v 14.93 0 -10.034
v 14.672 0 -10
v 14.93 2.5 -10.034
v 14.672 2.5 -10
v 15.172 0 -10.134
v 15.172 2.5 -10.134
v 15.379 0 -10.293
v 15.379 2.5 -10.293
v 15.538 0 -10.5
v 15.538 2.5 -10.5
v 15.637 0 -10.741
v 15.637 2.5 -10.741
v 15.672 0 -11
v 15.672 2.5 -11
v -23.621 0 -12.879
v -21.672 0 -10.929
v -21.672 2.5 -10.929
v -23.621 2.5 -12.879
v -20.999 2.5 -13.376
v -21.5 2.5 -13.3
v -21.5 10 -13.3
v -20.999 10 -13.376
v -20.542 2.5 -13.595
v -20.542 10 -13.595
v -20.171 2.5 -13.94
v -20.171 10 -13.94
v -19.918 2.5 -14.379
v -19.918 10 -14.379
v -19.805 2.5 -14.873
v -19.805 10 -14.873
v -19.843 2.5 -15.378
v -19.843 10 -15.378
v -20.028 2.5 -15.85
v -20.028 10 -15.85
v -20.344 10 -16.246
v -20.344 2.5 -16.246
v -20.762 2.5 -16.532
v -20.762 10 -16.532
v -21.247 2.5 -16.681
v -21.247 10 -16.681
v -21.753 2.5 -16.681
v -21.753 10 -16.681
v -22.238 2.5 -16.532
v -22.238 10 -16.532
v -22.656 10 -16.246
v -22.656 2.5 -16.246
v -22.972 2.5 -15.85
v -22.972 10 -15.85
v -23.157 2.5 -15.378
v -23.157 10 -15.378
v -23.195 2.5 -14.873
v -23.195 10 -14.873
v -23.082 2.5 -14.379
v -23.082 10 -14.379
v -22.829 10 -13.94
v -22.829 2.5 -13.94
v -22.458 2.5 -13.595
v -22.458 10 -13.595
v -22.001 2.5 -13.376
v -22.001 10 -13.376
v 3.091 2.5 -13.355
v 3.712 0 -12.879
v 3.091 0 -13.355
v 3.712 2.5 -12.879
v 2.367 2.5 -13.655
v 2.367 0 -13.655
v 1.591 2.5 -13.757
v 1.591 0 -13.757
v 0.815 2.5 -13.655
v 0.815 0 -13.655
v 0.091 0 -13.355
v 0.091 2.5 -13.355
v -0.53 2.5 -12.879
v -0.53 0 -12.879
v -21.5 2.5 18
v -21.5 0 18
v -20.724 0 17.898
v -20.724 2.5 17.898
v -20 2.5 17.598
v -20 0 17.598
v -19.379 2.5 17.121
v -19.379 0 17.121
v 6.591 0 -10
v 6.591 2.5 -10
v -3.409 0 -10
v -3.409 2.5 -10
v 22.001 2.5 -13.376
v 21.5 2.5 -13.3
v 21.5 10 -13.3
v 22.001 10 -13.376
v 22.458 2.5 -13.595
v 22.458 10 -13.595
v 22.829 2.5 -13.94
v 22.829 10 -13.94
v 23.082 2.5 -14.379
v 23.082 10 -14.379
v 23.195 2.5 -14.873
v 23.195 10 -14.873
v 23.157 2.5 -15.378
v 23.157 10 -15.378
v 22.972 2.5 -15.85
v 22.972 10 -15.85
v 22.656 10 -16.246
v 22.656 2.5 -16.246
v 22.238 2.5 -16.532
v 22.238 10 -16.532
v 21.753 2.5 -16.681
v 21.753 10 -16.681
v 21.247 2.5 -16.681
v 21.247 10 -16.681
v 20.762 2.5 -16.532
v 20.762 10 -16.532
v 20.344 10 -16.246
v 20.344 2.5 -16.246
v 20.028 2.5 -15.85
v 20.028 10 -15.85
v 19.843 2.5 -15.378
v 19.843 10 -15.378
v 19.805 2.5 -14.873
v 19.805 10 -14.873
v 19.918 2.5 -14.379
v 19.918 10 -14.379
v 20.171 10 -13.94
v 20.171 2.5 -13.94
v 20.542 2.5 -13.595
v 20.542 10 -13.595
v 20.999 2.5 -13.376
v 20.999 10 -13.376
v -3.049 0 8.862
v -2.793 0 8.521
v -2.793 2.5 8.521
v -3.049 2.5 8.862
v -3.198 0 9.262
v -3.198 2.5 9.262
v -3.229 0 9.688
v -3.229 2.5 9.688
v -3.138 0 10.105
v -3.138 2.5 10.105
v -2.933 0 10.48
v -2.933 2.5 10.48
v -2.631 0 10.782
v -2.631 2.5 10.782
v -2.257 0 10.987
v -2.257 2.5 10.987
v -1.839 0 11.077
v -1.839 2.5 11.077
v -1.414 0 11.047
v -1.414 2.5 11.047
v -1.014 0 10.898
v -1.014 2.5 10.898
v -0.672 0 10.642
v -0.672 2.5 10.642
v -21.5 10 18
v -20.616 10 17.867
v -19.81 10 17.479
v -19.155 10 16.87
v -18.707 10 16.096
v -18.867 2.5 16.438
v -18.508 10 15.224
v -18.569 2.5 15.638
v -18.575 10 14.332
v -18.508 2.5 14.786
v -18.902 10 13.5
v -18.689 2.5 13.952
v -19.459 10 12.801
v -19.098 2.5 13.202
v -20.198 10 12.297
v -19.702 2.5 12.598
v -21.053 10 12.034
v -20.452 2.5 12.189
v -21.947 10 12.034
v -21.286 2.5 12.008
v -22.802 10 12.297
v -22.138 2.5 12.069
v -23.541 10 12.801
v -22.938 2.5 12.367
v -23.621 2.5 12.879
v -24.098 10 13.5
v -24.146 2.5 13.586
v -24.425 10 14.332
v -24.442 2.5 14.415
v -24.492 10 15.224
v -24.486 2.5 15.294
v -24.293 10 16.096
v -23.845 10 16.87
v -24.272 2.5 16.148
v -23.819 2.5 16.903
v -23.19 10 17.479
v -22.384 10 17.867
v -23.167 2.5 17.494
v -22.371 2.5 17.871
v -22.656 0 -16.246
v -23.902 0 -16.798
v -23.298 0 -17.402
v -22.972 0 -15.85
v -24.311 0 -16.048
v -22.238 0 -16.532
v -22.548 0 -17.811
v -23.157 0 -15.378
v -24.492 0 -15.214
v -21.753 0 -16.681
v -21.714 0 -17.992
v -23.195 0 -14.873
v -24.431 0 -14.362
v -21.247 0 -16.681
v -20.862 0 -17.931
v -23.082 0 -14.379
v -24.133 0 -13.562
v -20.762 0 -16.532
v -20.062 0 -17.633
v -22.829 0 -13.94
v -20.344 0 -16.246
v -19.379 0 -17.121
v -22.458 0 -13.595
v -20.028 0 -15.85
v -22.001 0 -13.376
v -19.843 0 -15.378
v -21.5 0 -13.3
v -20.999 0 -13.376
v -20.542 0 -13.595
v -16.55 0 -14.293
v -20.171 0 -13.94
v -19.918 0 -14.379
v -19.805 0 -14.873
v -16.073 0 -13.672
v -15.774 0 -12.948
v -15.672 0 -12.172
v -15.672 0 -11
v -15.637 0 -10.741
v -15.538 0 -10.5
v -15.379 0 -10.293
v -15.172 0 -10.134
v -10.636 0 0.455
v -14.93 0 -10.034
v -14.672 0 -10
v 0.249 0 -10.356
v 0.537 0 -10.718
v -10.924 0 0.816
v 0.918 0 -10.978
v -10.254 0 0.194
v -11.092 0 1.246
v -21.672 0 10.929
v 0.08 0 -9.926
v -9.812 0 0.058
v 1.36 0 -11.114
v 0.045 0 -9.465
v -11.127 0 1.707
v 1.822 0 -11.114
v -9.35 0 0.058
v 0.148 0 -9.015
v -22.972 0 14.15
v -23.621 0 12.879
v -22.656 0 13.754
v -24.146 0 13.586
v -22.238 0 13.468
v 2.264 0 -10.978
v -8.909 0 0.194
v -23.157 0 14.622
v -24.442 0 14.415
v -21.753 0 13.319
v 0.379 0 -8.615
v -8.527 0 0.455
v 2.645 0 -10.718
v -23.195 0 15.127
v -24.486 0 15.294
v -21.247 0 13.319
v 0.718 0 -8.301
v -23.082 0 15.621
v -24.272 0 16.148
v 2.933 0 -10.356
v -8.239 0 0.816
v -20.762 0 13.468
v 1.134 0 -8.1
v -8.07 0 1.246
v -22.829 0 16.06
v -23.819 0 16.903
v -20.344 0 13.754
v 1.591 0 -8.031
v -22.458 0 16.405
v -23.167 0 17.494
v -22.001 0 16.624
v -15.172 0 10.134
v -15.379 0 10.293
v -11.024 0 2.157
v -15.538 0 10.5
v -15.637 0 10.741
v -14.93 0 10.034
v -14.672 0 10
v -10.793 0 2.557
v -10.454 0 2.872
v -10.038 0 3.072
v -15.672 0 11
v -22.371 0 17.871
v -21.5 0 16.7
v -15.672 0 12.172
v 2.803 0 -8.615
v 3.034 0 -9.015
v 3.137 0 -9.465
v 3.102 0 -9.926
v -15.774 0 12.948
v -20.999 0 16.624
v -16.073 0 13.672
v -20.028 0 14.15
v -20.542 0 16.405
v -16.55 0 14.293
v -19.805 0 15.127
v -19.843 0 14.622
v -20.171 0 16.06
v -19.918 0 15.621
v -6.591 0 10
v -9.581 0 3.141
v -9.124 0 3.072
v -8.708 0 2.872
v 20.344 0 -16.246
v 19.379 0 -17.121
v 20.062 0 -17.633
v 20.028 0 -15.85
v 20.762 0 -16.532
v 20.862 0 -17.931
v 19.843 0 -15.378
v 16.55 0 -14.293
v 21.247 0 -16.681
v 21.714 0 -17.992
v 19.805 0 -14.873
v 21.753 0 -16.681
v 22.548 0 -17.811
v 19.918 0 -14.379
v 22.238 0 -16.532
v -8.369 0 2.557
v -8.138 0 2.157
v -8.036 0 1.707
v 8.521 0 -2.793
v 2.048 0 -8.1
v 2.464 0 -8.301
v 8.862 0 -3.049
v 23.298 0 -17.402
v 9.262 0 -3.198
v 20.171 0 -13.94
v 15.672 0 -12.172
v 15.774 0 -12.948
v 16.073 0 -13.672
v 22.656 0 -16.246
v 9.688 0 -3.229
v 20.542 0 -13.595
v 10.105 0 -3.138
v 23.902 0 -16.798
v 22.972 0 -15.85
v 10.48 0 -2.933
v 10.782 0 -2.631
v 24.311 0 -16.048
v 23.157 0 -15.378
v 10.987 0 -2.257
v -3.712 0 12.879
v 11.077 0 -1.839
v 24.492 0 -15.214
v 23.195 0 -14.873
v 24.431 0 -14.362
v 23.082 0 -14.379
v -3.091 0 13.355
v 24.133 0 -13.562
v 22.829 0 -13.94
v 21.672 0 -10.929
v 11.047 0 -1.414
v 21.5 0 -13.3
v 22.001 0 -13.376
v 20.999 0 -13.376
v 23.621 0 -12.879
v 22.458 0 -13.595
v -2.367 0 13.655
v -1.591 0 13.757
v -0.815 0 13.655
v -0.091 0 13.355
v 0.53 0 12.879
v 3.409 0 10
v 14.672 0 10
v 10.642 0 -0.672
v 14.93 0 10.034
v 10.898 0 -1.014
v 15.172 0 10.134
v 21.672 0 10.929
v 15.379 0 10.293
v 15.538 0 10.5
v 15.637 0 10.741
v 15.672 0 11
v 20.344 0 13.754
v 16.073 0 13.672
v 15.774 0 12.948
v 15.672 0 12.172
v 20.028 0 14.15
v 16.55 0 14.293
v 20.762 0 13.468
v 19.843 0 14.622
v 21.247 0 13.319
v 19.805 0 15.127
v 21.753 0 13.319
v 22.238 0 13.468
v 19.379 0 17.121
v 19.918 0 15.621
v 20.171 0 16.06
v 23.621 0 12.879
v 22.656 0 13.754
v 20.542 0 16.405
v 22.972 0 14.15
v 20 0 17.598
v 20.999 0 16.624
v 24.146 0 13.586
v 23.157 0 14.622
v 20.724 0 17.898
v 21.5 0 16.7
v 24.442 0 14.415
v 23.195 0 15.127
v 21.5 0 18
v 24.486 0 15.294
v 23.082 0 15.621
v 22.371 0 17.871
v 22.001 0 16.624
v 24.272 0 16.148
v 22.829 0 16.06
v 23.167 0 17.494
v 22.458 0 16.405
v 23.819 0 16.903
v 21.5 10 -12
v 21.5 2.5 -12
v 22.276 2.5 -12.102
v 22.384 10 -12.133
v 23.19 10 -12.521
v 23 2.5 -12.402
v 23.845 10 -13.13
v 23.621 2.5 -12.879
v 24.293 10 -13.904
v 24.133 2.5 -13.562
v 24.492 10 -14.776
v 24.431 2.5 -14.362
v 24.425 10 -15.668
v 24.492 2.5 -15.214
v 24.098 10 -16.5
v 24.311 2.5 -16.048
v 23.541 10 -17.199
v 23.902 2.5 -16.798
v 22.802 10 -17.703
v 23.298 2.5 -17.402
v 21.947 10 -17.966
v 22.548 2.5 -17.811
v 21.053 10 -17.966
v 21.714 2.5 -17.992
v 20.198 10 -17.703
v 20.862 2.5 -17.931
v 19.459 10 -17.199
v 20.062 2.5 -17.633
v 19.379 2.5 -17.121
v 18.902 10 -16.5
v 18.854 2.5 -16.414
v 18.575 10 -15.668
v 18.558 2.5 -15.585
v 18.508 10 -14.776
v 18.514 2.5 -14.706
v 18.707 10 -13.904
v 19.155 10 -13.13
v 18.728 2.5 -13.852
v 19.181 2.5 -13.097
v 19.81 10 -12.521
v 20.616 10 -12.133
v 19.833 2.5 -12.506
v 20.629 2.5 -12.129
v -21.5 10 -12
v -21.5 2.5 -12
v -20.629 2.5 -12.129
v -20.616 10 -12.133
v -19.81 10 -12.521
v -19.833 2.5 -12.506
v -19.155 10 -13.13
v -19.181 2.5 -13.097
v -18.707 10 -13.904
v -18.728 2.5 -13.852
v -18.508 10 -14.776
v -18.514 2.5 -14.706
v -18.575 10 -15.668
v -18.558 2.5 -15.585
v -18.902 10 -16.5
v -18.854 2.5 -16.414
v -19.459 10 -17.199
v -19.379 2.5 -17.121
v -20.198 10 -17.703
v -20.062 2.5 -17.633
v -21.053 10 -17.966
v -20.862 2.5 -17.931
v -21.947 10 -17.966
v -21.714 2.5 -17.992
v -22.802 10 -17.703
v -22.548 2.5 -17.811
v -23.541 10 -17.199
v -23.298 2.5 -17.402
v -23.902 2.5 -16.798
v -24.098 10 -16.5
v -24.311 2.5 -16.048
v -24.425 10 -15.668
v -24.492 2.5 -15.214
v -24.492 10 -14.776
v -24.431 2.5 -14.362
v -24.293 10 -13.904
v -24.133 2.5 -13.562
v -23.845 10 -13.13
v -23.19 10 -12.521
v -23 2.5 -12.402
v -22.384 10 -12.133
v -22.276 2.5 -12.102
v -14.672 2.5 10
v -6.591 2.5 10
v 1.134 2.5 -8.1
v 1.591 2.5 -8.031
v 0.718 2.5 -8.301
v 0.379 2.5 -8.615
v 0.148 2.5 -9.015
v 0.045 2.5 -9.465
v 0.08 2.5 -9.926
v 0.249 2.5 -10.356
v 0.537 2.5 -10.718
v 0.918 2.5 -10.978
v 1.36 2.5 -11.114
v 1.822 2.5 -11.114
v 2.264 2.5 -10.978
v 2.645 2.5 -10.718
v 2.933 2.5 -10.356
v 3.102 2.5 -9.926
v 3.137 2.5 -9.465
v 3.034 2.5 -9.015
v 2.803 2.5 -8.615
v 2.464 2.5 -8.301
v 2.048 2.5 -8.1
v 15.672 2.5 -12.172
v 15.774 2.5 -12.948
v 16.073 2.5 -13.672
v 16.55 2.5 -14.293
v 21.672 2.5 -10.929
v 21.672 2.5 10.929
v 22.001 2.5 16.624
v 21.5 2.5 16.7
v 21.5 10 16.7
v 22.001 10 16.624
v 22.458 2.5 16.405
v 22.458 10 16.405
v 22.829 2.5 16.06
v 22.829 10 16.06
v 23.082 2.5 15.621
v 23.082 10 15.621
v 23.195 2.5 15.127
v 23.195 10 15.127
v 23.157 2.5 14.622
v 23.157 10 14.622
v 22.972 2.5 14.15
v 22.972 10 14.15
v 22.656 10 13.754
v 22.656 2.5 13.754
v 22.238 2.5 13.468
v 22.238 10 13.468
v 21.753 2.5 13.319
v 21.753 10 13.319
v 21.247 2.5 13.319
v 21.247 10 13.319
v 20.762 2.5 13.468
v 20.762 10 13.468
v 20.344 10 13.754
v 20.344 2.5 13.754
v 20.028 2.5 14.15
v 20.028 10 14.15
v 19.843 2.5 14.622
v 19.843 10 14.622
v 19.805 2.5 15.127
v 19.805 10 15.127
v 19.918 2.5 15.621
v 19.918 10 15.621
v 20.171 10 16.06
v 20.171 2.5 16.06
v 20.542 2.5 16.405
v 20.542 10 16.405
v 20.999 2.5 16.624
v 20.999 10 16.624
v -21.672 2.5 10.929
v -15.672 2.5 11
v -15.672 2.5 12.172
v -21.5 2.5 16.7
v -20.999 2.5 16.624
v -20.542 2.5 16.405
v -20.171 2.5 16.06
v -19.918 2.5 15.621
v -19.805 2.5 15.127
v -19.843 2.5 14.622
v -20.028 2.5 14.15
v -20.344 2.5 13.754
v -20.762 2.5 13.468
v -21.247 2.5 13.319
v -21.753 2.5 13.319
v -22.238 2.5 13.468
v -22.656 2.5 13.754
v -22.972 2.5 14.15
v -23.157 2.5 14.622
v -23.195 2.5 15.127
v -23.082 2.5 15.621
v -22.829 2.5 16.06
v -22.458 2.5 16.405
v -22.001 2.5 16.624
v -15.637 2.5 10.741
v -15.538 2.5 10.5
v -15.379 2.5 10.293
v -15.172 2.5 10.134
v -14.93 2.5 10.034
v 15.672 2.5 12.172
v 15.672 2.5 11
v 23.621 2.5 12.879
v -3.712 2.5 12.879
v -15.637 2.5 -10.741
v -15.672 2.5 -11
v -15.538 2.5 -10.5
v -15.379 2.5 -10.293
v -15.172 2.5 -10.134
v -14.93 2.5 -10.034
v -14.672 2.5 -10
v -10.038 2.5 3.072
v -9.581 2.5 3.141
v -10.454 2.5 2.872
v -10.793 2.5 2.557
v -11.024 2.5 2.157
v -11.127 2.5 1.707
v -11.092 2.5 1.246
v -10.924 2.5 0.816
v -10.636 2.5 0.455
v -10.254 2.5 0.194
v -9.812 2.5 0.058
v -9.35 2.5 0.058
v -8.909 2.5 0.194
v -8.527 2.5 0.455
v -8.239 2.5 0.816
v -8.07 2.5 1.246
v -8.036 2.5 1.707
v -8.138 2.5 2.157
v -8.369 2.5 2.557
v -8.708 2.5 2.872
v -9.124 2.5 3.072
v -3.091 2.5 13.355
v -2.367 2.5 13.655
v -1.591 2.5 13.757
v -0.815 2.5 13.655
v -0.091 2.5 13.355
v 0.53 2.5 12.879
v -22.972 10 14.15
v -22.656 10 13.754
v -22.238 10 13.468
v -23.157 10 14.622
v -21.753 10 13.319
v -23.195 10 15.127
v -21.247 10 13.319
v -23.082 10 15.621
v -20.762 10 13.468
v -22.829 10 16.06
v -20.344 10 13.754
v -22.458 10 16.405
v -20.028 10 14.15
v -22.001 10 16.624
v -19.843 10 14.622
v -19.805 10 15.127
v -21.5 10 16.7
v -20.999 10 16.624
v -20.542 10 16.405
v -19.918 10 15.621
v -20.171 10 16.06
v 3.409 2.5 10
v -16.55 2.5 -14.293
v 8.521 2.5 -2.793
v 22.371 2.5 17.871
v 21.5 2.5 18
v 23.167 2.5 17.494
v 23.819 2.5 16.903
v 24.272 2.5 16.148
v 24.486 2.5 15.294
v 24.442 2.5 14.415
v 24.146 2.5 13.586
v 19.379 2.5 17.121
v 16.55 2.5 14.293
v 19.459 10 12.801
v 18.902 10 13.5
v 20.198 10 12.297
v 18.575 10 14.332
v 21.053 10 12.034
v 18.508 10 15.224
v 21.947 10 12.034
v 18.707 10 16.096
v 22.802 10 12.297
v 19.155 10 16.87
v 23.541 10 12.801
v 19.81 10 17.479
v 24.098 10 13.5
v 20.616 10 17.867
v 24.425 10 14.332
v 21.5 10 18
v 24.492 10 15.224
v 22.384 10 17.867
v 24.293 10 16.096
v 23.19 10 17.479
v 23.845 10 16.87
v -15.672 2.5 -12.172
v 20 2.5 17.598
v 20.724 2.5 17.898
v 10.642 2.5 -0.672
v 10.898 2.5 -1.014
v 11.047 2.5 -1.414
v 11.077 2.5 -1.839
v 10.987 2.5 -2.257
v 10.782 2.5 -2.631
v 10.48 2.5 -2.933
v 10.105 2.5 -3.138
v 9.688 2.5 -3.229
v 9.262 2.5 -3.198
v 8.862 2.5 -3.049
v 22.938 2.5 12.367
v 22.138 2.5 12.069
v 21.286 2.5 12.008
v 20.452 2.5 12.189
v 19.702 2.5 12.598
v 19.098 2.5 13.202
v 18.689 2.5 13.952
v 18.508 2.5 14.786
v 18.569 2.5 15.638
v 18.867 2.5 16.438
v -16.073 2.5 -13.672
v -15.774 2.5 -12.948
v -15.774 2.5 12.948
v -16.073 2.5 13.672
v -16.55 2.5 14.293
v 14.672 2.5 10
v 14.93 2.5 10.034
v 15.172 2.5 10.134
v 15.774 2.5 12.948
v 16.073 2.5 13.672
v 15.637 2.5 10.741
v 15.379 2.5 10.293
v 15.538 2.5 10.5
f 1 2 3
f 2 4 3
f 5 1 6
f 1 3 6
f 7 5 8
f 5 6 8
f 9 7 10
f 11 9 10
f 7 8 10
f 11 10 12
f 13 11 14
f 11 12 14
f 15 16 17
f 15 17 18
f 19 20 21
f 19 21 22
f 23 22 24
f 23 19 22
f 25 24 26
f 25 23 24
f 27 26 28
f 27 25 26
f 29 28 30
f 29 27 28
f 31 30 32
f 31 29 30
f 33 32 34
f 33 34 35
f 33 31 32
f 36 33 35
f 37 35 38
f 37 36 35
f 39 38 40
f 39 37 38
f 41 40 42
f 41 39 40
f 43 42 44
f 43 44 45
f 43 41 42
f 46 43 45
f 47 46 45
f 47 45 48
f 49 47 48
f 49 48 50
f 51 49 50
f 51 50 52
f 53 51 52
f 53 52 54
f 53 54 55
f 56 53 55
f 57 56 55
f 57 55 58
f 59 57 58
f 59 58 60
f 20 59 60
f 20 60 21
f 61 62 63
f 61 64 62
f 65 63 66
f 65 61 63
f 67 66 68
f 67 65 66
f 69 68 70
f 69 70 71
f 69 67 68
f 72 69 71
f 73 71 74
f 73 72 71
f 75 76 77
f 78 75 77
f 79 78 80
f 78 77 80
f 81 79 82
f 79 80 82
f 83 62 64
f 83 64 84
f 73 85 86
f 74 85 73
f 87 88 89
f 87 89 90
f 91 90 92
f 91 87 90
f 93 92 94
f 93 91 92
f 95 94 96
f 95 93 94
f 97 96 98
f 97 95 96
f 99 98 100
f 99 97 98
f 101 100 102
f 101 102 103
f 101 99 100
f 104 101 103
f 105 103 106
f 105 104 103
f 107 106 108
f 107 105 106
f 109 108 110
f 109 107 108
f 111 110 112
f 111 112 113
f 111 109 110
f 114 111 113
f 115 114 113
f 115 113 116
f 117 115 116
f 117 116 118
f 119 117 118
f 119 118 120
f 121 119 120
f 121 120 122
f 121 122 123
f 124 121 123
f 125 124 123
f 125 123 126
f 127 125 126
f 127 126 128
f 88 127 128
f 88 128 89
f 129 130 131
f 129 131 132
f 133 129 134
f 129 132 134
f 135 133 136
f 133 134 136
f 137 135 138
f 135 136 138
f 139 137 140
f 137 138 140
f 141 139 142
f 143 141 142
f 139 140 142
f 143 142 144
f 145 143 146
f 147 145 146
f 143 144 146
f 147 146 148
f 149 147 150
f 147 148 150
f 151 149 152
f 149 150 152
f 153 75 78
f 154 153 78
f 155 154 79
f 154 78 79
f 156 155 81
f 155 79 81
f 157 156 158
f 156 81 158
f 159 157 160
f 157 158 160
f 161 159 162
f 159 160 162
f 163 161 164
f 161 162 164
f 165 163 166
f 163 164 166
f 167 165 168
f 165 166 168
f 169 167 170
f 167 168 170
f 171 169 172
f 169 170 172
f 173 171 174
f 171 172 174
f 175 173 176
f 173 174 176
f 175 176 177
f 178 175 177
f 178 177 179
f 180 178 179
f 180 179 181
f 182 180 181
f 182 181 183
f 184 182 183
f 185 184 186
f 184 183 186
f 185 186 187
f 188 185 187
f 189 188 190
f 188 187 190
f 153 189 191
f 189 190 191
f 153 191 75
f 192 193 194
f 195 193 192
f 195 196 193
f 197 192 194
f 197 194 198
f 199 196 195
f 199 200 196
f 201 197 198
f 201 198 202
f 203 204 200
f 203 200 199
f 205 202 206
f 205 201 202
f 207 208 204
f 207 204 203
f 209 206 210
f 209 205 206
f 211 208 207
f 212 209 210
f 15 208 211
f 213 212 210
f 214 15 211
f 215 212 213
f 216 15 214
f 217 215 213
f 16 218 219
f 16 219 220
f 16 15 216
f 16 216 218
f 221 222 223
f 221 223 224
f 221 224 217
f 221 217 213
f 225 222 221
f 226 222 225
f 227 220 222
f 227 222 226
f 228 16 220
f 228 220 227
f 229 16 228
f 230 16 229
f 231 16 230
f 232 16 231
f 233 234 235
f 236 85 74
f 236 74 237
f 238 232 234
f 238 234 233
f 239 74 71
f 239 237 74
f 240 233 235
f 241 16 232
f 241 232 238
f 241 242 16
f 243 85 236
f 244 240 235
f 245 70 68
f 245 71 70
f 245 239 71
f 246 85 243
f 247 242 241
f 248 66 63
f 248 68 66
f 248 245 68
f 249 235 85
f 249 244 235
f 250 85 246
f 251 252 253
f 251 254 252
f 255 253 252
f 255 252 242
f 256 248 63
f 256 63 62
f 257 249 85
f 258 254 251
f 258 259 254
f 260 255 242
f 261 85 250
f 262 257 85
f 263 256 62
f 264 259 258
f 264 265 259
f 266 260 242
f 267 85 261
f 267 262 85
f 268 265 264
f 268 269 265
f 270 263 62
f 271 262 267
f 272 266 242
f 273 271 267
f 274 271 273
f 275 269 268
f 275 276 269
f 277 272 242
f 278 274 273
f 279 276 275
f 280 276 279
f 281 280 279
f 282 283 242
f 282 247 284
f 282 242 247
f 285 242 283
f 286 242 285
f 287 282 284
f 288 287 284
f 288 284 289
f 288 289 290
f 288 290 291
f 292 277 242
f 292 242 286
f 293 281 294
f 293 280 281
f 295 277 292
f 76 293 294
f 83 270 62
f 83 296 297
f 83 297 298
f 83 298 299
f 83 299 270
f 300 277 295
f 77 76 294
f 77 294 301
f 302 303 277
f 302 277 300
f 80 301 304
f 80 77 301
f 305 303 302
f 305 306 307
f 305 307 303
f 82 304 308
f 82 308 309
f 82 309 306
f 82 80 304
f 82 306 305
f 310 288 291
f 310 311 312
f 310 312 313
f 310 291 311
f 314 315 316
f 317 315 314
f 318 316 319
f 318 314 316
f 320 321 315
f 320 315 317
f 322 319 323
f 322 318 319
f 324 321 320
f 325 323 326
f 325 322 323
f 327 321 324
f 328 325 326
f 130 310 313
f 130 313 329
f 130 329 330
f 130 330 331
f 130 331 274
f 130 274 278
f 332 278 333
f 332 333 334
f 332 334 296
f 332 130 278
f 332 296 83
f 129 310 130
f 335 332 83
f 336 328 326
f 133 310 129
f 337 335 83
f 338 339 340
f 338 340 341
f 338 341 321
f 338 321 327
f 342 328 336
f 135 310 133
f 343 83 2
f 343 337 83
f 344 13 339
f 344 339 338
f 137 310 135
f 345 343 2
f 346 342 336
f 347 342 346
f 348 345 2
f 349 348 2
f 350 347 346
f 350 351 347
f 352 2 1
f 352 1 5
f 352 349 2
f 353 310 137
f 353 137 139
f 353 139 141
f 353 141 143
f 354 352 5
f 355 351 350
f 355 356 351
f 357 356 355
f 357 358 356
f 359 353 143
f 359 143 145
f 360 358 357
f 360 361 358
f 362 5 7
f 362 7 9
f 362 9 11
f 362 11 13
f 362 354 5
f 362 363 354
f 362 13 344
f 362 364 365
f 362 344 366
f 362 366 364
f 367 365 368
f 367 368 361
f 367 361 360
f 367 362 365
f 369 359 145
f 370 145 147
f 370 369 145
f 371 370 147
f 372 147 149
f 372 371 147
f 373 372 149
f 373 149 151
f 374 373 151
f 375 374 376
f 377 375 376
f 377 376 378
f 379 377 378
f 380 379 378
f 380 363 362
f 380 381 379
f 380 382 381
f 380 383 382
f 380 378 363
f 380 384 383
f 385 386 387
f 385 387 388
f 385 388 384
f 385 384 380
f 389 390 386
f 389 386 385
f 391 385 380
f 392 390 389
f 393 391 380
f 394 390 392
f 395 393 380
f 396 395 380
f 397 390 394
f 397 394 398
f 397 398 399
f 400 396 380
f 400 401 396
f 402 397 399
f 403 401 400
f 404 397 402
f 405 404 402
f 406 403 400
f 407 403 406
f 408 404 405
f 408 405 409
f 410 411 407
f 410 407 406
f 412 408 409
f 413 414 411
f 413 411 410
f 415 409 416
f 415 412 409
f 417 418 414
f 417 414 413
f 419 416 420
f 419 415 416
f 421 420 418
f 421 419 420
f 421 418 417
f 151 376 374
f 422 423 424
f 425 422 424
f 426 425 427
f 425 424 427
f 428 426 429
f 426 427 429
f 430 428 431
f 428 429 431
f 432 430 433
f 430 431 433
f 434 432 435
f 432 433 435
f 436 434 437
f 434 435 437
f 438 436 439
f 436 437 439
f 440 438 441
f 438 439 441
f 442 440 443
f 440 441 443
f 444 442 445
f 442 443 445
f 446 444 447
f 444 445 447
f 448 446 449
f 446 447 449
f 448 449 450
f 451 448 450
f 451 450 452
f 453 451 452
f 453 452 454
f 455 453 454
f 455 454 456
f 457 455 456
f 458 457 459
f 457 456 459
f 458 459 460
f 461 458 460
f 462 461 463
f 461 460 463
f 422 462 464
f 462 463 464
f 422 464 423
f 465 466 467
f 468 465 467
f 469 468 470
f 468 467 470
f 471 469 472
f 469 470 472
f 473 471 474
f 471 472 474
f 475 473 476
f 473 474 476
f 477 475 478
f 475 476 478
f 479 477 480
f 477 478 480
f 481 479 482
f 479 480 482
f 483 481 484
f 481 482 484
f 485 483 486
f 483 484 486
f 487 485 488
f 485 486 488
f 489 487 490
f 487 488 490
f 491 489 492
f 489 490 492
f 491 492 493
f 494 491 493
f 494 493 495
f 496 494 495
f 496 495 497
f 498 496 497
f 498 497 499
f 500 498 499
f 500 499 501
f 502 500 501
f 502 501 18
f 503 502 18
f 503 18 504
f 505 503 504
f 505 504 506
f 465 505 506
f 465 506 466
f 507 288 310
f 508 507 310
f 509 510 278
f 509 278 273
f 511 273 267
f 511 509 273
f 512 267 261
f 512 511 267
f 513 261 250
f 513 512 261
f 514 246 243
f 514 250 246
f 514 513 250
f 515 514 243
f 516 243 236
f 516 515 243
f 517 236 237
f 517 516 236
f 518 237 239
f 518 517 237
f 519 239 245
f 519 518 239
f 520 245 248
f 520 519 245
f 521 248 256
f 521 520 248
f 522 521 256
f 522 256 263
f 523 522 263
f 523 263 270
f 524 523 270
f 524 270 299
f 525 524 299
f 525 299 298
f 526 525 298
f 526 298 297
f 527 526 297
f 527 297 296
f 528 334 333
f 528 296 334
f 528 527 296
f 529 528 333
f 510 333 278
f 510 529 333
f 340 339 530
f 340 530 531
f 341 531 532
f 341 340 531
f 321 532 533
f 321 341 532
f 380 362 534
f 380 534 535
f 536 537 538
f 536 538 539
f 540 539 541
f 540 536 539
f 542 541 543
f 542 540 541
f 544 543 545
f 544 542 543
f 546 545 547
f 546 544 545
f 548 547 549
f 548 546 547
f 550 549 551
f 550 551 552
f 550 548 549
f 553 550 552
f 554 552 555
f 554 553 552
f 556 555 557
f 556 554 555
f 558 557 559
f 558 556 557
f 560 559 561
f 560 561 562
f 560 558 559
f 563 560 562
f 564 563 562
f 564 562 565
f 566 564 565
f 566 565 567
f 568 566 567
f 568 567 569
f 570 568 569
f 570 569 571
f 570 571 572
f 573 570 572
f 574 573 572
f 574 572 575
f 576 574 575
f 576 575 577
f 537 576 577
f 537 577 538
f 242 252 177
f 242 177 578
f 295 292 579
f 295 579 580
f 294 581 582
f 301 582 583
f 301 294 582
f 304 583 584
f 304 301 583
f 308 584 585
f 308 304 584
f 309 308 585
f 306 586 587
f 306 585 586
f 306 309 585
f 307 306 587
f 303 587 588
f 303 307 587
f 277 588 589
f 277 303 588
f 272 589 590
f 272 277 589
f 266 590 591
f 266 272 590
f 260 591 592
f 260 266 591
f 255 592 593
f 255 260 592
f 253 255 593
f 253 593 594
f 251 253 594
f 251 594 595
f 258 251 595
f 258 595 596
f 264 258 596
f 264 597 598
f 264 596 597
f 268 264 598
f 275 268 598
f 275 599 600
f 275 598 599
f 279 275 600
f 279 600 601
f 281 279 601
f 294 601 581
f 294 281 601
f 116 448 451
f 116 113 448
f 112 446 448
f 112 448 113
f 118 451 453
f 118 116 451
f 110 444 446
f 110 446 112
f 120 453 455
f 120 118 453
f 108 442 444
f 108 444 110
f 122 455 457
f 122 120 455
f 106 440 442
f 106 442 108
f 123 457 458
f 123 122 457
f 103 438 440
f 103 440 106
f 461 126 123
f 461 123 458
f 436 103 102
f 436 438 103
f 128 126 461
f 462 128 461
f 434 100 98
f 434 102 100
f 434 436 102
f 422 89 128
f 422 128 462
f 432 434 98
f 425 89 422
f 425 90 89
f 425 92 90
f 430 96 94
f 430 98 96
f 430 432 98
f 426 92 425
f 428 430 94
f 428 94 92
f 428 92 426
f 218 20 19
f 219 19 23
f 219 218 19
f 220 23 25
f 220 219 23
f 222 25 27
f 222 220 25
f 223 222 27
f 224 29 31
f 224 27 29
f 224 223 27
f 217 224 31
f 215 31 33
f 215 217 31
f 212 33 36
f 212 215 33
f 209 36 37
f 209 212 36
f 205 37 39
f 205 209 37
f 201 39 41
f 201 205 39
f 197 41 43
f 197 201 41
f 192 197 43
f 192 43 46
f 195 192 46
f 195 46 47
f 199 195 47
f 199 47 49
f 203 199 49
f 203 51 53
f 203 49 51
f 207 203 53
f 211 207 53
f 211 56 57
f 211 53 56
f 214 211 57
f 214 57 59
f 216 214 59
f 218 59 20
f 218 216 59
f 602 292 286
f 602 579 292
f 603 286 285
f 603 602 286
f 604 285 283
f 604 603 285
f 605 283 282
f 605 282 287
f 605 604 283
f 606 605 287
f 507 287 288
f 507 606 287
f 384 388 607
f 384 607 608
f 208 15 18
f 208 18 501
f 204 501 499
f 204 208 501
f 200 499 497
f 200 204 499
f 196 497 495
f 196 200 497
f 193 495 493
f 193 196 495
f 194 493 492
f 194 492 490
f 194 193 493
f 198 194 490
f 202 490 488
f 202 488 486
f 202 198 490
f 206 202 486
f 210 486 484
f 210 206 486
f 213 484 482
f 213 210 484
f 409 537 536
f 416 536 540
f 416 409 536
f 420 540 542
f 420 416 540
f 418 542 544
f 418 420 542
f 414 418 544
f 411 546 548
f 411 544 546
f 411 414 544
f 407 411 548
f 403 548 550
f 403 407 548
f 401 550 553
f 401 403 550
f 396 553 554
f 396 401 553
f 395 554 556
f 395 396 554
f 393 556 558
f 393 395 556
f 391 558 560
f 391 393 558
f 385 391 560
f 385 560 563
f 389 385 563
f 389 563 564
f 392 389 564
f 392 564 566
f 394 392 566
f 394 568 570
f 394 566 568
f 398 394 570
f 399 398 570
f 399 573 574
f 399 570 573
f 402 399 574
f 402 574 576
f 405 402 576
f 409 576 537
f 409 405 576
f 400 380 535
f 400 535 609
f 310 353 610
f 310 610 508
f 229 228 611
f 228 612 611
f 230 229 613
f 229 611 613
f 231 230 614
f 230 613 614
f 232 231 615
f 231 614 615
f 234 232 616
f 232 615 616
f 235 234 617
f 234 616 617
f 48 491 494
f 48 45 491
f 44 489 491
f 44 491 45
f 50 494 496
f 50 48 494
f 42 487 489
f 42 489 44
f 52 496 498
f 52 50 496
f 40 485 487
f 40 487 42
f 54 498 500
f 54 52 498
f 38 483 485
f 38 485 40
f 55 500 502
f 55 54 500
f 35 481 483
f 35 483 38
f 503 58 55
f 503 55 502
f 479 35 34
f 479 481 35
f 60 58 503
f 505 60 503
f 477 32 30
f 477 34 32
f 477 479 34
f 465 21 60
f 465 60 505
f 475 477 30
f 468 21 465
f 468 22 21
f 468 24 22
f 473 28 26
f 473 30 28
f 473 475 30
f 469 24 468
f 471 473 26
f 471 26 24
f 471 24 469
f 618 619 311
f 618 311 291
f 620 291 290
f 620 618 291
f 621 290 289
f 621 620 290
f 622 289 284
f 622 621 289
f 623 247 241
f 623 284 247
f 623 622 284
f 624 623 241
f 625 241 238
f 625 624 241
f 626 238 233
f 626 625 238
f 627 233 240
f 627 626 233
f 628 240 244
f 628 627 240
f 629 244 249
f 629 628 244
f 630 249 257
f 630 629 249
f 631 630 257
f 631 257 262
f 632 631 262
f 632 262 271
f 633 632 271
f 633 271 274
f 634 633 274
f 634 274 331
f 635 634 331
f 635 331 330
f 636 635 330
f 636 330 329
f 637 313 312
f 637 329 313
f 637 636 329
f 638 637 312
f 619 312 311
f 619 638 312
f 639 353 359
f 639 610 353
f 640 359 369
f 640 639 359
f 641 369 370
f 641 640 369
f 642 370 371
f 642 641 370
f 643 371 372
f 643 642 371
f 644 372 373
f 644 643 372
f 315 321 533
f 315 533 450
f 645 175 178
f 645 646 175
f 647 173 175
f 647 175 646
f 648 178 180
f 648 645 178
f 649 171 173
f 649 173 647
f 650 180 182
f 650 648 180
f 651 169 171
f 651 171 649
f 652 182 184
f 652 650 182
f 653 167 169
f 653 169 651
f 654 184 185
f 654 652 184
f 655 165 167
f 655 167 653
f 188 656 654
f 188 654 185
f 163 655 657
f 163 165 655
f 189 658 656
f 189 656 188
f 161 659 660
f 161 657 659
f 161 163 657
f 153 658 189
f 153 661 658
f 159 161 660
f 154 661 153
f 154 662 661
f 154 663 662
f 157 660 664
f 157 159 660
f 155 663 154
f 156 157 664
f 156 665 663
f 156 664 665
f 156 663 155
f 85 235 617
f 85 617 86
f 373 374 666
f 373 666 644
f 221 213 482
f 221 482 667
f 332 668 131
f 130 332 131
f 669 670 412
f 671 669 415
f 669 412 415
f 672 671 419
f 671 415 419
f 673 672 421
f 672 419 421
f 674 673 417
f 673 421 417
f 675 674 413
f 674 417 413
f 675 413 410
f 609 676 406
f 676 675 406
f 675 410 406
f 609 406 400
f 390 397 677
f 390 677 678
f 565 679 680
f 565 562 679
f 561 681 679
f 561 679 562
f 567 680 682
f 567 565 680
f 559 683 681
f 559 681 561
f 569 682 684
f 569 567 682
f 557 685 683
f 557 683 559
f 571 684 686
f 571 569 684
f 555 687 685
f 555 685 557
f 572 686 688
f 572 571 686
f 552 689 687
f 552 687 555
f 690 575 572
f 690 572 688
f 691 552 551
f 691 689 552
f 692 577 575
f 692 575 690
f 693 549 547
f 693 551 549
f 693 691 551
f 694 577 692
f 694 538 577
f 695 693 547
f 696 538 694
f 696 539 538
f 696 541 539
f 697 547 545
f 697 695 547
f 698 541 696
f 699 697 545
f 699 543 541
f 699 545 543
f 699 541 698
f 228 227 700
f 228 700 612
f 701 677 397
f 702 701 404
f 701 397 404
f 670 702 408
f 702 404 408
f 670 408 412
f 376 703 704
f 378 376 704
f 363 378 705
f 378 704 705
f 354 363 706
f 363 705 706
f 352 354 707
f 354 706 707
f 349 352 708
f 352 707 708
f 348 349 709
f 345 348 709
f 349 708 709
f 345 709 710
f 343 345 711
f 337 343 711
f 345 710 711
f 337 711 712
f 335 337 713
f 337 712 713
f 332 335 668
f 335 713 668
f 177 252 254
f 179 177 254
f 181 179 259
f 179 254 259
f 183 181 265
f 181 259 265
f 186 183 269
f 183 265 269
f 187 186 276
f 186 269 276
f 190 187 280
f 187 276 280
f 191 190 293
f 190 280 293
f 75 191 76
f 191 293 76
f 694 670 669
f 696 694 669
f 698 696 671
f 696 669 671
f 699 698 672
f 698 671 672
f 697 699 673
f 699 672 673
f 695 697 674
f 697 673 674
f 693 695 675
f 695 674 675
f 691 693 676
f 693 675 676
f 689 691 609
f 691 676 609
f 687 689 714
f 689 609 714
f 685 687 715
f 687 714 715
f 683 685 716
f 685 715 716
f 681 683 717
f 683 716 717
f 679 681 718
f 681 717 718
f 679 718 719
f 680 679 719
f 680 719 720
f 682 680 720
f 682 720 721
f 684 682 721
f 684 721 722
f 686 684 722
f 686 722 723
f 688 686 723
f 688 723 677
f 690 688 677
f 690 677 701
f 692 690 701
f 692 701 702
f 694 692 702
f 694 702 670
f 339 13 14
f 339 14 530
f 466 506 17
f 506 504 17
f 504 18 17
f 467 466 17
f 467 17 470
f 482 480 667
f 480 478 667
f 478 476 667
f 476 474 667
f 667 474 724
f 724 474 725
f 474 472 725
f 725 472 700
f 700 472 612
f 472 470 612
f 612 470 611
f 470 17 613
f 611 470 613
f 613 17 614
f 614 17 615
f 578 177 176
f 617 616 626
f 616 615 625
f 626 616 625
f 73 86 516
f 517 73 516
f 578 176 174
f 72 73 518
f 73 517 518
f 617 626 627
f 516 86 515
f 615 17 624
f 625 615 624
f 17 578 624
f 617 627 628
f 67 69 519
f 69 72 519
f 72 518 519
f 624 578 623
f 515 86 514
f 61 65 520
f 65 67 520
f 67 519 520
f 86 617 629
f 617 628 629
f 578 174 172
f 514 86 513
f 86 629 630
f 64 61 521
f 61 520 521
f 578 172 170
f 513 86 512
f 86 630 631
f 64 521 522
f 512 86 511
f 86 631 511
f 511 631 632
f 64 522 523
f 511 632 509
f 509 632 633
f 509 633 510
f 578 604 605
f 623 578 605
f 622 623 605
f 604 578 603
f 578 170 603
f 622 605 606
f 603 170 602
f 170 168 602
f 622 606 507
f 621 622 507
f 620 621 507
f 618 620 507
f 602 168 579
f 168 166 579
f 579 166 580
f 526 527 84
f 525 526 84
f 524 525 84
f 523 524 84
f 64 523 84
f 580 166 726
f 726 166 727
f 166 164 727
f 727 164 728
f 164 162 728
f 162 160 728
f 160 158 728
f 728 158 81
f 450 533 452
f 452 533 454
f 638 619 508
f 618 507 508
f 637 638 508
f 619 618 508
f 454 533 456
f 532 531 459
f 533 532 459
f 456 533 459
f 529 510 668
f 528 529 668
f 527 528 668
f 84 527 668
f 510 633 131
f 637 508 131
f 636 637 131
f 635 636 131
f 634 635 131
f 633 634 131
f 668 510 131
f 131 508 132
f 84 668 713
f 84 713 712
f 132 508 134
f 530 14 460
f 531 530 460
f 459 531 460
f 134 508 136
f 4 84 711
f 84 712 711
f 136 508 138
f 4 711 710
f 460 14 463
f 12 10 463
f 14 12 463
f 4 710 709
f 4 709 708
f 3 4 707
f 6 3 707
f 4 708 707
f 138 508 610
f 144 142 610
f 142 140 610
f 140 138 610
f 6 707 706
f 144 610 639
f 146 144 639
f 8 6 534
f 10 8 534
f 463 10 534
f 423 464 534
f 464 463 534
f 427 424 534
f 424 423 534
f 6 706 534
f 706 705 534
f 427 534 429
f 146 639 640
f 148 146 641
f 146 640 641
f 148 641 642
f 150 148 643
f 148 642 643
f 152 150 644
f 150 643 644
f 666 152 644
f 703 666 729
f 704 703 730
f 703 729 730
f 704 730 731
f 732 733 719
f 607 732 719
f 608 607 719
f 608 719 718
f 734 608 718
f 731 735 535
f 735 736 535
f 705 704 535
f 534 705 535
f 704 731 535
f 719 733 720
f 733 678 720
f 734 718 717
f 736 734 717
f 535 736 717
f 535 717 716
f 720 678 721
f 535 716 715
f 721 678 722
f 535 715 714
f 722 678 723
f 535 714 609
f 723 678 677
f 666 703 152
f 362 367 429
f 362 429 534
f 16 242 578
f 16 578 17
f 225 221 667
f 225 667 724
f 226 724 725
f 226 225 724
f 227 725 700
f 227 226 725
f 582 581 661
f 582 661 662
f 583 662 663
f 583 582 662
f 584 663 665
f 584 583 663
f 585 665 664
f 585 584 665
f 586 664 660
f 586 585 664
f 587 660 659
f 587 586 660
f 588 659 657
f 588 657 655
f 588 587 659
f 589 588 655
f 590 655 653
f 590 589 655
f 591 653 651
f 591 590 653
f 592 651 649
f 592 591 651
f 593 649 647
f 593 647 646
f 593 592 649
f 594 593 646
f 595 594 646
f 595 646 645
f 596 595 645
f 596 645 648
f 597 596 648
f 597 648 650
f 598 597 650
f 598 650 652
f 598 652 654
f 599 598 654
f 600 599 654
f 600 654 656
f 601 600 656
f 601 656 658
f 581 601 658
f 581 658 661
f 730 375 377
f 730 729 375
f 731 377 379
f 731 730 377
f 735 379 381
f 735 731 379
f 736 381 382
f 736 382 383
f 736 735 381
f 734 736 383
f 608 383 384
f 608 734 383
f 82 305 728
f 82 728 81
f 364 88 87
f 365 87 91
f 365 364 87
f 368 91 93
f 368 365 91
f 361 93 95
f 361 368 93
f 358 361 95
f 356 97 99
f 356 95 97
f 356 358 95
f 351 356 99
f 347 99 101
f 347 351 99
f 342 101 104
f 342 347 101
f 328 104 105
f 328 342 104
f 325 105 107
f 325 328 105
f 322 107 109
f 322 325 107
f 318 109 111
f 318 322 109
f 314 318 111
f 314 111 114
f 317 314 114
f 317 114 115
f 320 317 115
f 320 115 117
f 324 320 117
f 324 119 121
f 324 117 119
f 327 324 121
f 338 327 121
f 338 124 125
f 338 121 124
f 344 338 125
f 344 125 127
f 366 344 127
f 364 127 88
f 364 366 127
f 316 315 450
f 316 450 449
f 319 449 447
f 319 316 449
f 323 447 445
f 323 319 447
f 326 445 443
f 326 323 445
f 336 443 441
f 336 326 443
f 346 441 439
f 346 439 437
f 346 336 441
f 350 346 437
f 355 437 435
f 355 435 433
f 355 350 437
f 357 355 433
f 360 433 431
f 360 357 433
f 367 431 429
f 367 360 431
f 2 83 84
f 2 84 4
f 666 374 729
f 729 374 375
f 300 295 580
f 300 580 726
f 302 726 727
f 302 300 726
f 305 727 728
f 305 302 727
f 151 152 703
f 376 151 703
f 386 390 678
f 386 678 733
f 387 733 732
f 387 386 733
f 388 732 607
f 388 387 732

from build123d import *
from build123d.topology import SkipClean

# Parameters (mm, degrees)
SKETCH1_R               = 3
SKETCH1_R_2             = 1.7
BOSS_EXTRUDE1_DEPTH     = 10
BOSS_EXTRUDE1_2_DEPTH   = 10
BOSS_EXTRUDE1_3_DEPTH   = 10
BOSS_EXTRUDE1_4_DEPTH   = 10
BOSS_EXTRUDE2_DEPTH     = 2.5
CUT_EXTRUDE1_DEPTH      = 33.003906012
CUT_EXTRUDE1_DEPTH_BACK = 33.003906012
SKETCH1_2_R             = 1.7
SKETCH4_W               = 31.34314575
SKETCH4_H               = 20
BOSS_EXTRUDE3_DEPTH     = 2.5
FILLET2_R               = 1
BOSS_EXTRUDE4_DEPTH     = 2.5
CUT_EXTRUDE3_DEPTH      = 33.003906012
CUT_EXTRUDE3_DEPTH_BACK = 33.003906012
SKETCH5_R               = 1.55
FILLET3_R               = 3


with BuildPart() as part:
    # Sketch1 → Boss-Extrude1 (new body)
    with BuildSketch(Plane(origin=(0, 0, 0), x_dir=(1, 0, 0), z_dir=(0, 1, 0))):
        with Locations(Location((-21.5, 15, 0), (0, 0, 270))):
            Circle(SKETCH1_R)
        with Locations(Location((-21.5, 15, 0), (0, 0, 270))):
            Circle(SKETCH1_R_2, mode=Mode.SUBTRACT)
    extrude(amount=BOSS_EXTRUDE1_DEPTH)



with BuildPart() as body_2:
    # Sketch1 → Boss-Extrude1 2 (new body)
    with BuildSketch(Plane(origin=(0, 0, 0), x_dir=(1, 0, 0), z_dir=(0, 1, 0))):
        with Locations(Location((-21.5, -15, 0), (0, 0, 270))):
            Circle(SKETCH1_R)
        with Locations(Location((-21.5, -15, 0), (0, 0, 270))):
            Circle(SKETCH1_R_2, mode=Mode.SUBTRACT)
    extrude(amount=BOSS_EXTRUDE1_2_DEPTH)


with BuildPart() as body_3:
    # Sketch1 → Boss-Extrude1 3 (new body)
    with BuildSketch(Plane(origin=(0, 0, 0), x_dir=(1, 0, 0), z_dir=(0, 1, 0))):
        with Locations(Location((21.5, -15, 0), (0, 0, 270))):
            Circle(SKETCH1_R)
        with Locations(Location((21.5, -15, 0), (0, 0, 270))):
            Circle(SKETCH1_R_2, mode=Mode.SUBTRACT)
    extrude(amount=BOSS_EXTRUDE1_3_DEPTH)


with BuildPart() as body_4:
    # Sketch1 → Boss-Extrude1 4 (new body)
    with BuildSketch(Plane(origin=(0, 0, 0), x_dir=(1, 0, 0), z_dir=(0, 1, 0))):
        with Locations(Location((21.5, 15, 0), (0, 0, 270))):
            Circle(SKETCH1_R)
        with Locations(Location((21.5, 15, 0), (0, 0, 270))):
            Circle(SKETCH1_R_2, mode=Mode.SUBTRACT)
    extrude(amount=BOSS_EXTRUDE1_4_DEPTH)


with BuildPart() as part_1:
    with SkipClean():  # the faces are left unmerged after this step: merging them gives an invalid solid
        add(part.part)

        add(body_2.part)  # Boss-Extrude2 merges body 2

        add(body_3.part)  # Boss-Extrude2 merges body 3

        add(body_4.part)  # Boss-Extrude2 merges body 4
        # Sketch2 → Boss-Extrude2 (add)
        with BuildSketch(Plane(origin=(0, 0, 0), x_dir=(1, 0, 0), z_dir=(0, 1, 0))):
            with BuildLine():
                Line((-15.671572875, 12.171572875), (-15.671572875, -12.171572875))
                ThreePointArc((-15.671572875, -12.171572875), (-15.899934278, -13.319623172), (-16.550252532, -14.292893219))
                Line((-16.550252532, -14.292893219), (-19.378679656, -17.121320344))
                ThreePointArc((-19.378679656, -17.121320344), (-23.621320344, -17.121320344), (-23.621320344, -12.878679656))
                Line((-23.621320344, -12.878679656), (-21.671572875, -10.928932188))
                Line((-21.671572875, -10.928932188), (-21.671572875, 10.928932188))
                Line((-21.671572875, 10.928932188), (-23.621320344, 12.878679656))
                ThreePointArc((-23.621320344, 12.878679656), (-23.621320344, 17.121320344), (-19.378679656, 17.121320344))
                Line((-19.378679656, 17.121320344), (-16.550252532, 14.292893219))
                ThreePointArc((-16.550252532, 14.292893219), (-15.899934278, 13.319623172), (-15.671572875, 12.171572875))
            make_face()
            with BuildLine():
                ThreePointArc((19.378679656, 17.121320344), (23.621320344, 17.121320344), (23.621320344, 12.878679656))
                Line((23.621320344, 12.878679656), (21.671572875, 10.928932188))
                Line((21.671572875, 10.928932188), (21.671572875, -10.928932188))
                Line((21.671572875, -10.928932188), (23.621320344, -12.878679656))
                ThreePointArc((23.621320344, -12.878679656), (23.621320344, -17.121320344), (19.378679656, -17.121320344))
                Line((19.378679656, -17.121320344), (16.550252532, -14.292893219))
                ThreePointArc((16.550252532, -14.292893219), (15.899934278, -13.319623172), (15.671572875, -12.171572875))
                Line((15.671572875, -12.171572875), (15.671572875, 12.171572875))
                ThreePointArc((15.671572875, 12.171572875), (15.899934278, 13.319623172), (16.550252532, 14.292893219))
                Line((16.550252532, 14.292893219), (19.378679656, 17.121320344))
            make_face()
        extrude(amount=BOSS_EXTRUDE2_DEPTH)

    # Sketch1<2> → Cut-Extrude1 (cut, two sides: drawn at the far end of the back side and taken through both)
    with SkipClean():  # the faces are left unmerged after this step: merging them gives an invalid solid
        with BuildSketch(Plane(origin=(0, 0, 0), x_dir=(1, 0, 0), z_dir=(0, 1, 0)).offset(-CUT_EXTRUDE1_DEPTH_BACK)):
            with Locations(Location((-21.5, -15, 0), (0, 0, 270))):
                Circle(SKETCH1_2_R)
            with Locations(Location((-21.5, 15, 0), (0, 0, 270))):
                Circle(SKETCH1_2_R)
            with Locations(Location((21.5, 15, 0), (0, 0, 270))):
                Circle(SKETCH1_2_R)
            with Locations(Location((21.5, -15, 0), (0, 0, 270))):
                Circle(SKETCH1_2_R)
        extrude(amount=CUT_EXTRUDE1_DEPTH + CUT_EXTRUDE1_DEPTH_BACK, mode=Mode.SUBTRACT)

    # Sketch4 → Boss-Extrude3 (add)
    with SkipClean():  # the faces are left unmerged after this step: merging them gives an invalid solid
        with BuildSketch(Plane(origin=(0, 0, 0), x_dir=(1, 0, 0), z_dir=(0, 1, 0))):
            Rectangle(SKETCH4_W, SKETCH4_H)
        extrude(amount=BOSS_EXTRUDE3_DEPTH)

    # Fillet2
    fillet2_edges = [part_1.edges().sort_by_distance(p)[0] for p in [
        (15.671572875, 1.25, 10),
        (15.671572875, 1.25, -10),
        (-15.671572875, 1.25, -10),
        (-15.671572875, 1.25, 10),
    ]]
    fillet(fillet2_edges, radius=FILLET2_R)

    # Sketch6 → Boss-Extrude4 (add)
    with SkipClean():  # the faces are left unmerged after this step: merging them gives an invalid solid
        with BuildSketch(Plane.XZ):
            Polygon((1.590990258, -4.16259377), (-3.827712857, -9.581296885), (1.590990258, -15), (7.009693373, -9.581296885), align=None)
            Polygon((-1.590990258, 15), (-9.445268772, 7.145721485), (-1.590990258, -0.70855703), (6.263288257, 7.145721485), align=None)
        extrude(amount=-BOSS_EXTRUDE4_DEPTH)

    # Sketch5 → Cut-Extrude3 (cut, two sides: drawn at the far end of the back side and taken through both)
    with SkipClean():  # the faces are left unmerged after this step: merging them gives an invalid solid
        with BuildSketch(Plane.XZ.offset(-CUT_EXTRUDE3_DEPTH_BACK)):
            with Locations(Location((-9.581296885, 1.590990258, 0), (0, 0, 90))):
                Circle(SKETCH5_R)
            with Locations(Location((1.590990258, -9.581296885, 0), (0, 0, 90))):
                Circle(SKETCH5_R)
            with BuildLine():
                Line((-0.671751442, 10.641957057), (10.641957057, -0.671751442))
                ThreePointArc((10.641957057, -0.671751442), (10.641957057, -2.793071786), (8.520636713, -2.793071786))
                Line((8.520636713, -2.793071786), (-2.793071786, 8.520636713))
                ThreePointArc((-2.793071786, 8.520636713), (-2.793071786, 10.641957057), (-0.671751442, 10.641957057))
            make_face()
        extrude(amount=CUT_EXTRUDE3_DEPTH + CUT_EXTRUDE3_DEPTH_BACK, mode=Mode.SUBTRACT)

    # Fillet3
    fillet3_edges = [part_1.edges().sort_by_distance(p)[0] for p in [
        (1.590990258, 1.25, -15),
        (-1.590990258, 1.25, 15),
    ]]
    fillet(fillet3_edges, radius=FILLET3_R)


solid = part_1.part
